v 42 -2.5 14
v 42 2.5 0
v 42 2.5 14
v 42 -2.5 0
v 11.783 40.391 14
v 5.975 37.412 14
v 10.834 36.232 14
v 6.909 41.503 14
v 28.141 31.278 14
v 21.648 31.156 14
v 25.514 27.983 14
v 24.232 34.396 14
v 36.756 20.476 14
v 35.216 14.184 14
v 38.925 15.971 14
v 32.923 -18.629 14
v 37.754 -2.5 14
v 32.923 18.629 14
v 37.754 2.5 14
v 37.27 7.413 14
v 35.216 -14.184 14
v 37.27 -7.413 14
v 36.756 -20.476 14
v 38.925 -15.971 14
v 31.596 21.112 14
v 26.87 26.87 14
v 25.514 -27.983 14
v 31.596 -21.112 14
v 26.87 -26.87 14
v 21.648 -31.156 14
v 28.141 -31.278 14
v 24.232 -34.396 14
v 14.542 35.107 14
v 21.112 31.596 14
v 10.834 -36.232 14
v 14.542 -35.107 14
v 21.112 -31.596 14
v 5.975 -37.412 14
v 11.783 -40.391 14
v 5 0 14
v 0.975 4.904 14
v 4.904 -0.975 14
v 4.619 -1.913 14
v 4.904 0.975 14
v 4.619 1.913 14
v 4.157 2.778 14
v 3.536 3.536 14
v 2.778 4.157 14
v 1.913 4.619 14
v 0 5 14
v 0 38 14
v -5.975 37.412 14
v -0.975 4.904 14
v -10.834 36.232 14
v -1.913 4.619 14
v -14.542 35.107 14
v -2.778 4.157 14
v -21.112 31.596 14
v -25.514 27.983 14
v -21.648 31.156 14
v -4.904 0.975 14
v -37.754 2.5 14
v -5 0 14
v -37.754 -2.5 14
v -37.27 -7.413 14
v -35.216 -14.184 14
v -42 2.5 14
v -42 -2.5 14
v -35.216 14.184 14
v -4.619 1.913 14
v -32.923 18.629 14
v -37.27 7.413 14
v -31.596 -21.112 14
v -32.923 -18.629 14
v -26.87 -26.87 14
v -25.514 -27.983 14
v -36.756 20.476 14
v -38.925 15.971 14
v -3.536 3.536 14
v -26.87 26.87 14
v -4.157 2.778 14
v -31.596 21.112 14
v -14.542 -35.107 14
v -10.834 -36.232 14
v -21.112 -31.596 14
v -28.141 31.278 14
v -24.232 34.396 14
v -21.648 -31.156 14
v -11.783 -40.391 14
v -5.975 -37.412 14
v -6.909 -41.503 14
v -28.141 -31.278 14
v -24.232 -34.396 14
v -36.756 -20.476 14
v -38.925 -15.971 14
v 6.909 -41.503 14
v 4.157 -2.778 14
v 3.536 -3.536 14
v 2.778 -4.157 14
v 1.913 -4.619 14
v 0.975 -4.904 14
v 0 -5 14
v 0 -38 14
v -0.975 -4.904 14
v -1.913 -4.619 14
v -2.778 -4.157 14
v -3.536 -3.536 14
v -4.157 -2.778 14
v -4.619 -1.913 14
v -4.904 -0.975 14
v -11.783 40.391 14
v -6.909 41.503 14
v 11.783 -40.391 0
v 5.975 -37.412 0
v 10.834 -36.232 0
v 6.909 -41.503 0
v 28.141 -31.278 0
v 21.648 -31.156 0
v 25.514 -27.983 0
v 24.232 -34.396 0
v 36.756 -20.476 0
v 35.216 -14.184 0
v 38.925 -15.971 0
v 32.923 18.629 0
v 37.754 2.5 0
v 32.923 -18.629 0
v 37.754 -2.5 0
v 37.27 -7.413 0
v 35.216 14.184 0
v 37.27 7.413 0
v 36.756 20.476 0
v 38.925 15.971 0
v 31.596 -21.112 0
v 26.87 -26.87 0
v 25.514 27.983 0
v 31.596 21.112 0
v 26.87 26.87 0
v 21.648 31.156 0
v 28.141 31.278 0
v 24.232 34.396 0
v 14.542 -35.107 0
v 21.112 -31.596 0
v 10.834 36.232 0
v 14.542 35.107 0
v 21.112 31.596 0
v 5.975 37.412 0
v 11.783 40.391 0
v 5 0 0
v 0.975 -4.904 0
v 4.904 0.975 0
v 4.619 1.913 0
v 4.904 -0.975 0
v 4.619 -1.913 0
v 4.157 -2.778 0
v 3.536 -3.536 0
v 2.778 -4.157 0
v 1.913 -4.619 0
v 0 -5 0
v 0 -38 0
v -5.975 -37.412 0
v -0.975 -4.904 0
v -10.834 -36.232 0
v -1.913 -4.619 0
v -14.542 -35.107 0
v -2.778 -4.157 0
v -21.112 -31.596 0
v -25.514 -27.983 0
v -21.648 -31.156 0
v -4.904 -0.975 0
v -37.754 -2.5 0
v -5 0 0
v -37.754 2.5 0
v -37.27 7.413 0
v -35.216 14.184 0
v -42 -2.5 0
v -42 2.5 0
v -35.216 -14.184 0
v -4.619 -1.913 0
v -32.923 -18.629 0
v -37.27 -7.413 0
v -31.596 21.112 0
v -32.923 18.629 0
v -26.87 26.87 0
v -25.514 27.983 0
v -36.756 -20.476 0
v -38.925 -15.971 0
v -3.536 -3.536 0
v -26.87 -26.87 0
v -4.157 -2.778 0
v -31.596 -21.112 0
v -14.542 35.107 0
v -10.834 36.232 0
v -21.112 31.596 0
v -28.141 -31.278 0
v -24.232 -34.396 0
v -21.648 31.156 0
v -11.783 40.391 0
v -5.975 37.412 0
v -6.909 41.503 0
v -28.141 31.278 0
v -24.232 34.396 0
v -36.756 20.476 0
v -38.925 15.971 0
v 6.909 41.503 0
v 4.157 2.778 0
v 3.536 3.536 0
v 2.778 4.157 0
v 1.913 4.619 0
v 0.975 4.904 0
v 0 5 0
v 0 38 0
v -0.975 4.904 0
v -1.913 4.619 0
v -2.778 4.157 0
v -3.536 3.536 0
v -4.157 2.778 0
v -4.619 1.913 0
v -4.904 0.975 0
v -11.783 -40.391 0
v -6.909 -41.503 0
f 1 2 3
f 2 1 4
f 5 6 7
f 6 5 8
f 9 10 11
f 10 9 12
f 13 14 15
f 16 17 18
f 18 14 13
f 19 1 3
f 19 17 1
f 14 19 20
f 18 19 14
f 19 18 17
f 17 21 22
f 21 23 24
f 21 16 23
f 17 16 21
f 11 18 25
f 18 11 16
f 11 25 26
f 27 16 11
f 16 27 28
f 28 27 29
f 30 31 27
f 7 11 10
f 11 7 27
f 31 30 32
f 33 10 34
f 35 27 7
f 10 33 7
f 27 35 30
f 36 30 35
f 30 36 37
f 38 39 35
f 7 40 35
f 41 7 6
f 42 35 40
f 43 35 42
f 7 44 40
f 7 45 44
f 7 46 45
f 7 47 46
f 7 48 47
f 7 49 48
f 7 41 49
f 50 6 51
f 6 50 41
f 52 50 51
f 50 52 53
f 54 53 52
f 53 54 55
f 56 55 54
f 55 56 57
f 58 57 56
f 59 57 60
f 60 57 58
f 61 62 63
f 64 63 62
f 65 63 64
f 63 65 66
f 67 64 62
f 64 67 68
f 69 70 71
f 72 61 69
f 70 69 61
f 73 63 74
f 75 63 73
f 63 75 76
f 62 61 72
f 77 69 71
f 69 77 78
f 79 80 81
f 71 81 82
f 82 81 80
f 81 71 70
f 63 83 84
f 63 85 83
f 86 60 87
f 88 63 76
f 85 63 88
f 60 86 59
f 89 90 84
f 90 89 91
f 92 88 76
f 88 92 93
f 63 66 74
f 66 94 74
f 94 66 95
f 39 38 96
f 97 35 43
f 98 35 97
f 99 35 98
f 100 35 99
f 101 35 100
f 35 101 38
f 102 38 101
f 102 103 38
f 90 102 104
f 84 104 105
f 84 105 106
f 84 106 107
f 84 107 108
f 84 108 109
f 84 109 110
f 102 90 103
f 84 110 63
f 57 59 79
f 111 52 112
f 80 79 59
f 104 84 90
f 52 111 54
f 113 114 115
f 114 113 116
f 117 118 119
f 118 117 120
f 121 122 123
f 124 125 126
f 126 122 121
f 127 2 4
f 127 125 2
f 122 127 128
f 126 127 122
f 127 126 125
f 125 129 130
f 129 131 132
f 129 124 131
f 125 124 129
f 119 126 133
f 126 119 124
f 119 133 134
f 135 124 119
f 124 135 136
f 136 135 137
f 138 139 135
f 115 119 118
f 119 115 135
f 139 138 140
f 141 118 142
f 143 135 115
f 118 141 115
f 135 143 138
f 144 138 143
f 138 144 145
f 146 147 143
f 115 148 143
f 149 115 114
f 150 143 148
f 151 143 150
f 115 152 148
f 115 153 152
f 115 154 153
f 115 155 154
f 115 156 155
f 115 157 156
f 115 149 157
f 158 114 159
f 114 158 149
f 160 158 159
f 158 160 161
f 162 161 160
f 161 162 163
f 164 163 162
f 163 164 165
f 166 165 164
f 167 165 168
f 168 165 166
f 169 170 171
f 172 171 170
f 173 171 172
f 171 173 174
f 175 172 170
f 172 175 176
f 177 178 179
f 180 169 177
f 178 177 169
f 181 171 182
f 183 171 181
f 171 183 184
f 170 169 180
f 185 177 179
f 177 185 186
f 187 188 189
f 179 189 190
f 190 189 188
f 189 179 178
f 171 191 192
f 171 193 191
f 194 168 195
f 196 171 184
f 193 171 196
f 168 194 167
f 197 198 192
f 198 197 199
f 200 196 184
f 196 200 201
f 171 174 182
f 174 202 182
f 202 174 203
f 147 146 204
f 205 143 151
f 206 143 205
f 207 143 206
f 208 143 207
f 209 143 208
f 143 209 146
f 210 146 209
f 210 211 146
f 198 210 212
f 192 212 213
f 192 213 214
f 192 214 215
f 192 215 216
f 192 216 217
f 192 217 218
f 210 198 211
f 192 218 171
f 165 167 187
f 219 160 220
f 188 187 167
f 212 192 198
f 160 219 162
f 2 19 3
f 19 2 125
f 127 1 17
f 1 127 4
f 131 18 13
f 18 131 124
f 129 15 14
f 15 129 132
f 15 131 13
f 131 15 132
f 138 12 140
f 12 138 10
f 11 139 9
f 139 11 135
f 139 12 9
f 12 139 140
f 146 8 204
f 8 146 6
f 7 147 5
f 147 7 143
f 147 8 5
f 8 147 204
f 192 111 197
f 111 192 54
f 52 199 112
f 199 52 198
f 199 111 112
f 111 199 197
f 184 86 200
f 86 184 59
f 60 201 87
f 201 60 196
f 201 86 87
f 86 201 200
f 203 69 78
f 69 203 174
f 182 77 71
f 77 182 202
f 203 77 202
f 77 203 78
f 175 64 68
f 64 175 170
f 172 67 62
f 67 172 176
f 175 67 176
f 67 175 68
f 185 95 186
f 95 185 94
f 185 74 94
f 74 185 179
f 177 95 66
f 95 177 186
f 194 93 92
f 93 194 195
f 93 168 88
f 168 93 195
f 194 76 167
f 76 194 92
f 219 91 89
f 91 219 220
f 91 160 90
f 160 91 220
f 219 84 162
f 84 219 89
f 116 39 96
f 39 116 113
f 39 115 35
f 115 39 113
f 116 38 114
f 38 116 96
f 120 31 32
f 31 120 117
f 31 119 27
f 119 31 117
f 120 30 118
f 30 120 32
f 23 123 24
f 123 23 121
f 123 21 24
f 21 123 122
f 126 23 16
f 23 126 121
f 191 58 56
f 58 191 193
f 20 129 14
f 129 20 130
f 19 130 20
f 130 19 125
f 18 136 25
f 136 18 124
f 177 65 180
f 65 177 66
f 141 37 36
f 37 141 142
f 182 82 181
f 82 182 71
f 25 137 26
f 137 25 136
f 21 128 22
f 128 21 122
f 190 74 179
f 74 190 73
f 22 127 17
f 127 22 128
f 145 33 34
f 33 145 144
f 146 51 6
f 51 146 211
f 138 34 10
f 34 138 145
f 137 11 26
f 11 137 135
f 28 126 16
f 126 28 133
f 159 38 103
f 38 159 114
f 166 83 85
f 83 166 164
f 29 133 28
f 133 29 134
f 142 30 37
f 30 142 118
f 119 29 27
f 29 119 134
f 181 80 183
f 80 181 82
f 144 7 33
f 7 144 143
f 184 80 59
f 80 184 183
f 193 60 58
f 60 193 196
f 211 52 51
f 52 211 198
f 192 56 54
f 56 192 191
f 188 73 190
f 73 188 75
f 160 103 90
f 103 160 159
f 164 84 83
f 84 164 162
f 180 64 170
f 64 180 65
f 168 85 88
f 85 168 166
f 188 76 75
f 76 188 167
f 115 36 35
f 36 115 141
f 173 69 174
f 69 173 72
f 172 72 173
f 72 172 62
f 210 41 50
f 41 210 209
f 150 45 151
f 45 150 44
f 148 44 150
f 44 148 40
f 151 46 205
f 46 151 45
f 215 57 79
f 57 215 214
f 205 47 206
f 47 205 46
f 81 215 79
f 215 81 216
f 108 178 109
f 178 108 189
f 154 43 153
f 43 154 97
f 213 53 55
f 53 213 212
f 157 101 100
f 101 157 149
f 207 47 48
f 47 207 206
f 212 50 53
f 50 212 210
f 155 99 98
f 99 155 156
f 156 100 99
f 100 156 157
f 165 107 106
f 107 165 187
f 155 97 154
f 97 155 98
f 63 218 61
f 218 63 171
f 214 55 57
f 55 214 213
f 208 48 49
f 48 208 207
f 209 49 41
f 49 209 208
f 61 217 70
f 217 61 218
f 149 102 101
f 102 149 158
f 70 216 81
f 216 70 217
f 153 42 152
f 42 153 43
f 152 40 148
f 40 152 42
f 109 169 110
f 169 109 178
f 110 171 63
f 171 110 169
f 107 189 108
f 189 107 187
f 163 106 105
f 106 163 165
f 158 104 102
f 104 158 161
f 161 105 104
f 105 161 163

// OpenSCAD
$fn = 32;

// ----------------------------------------------------------------------
// Spur blank: bored gear blank
// ----------------------------------------------------------------------

// --- parameters (mm) ---
disc_r = 38;              // blank root radius
disc_t = 14;              // blank thickness
n_teeth = 14;             // stub tooth count
tooth_w = 5;              // tooth width at the root
tooth_h = 4;              // tooth height above the root
bore_r = 5;               // central bore radius

out_r = disc_r + tooth_h;  // tip radius
bbox_x = 84.0;  // measured width over the teeth
bbox_y = 83.01;  // measured depth over the teeth

difference() {
union() {
  cylinder(r = disc_r, h = disc_t);
  for (i = [0 : n_teeth - 1])
    rotate([0, 0, i * 360 / n_teeth])
      translate([disc_r - 1, -tooth_w / 2, 0])
        cube([tooth_h + 1, tooth_w, disc_t]);
}
  translate([0, 0, -1]) cylinder(r = bore_r, h = disc_t + 2);
}
